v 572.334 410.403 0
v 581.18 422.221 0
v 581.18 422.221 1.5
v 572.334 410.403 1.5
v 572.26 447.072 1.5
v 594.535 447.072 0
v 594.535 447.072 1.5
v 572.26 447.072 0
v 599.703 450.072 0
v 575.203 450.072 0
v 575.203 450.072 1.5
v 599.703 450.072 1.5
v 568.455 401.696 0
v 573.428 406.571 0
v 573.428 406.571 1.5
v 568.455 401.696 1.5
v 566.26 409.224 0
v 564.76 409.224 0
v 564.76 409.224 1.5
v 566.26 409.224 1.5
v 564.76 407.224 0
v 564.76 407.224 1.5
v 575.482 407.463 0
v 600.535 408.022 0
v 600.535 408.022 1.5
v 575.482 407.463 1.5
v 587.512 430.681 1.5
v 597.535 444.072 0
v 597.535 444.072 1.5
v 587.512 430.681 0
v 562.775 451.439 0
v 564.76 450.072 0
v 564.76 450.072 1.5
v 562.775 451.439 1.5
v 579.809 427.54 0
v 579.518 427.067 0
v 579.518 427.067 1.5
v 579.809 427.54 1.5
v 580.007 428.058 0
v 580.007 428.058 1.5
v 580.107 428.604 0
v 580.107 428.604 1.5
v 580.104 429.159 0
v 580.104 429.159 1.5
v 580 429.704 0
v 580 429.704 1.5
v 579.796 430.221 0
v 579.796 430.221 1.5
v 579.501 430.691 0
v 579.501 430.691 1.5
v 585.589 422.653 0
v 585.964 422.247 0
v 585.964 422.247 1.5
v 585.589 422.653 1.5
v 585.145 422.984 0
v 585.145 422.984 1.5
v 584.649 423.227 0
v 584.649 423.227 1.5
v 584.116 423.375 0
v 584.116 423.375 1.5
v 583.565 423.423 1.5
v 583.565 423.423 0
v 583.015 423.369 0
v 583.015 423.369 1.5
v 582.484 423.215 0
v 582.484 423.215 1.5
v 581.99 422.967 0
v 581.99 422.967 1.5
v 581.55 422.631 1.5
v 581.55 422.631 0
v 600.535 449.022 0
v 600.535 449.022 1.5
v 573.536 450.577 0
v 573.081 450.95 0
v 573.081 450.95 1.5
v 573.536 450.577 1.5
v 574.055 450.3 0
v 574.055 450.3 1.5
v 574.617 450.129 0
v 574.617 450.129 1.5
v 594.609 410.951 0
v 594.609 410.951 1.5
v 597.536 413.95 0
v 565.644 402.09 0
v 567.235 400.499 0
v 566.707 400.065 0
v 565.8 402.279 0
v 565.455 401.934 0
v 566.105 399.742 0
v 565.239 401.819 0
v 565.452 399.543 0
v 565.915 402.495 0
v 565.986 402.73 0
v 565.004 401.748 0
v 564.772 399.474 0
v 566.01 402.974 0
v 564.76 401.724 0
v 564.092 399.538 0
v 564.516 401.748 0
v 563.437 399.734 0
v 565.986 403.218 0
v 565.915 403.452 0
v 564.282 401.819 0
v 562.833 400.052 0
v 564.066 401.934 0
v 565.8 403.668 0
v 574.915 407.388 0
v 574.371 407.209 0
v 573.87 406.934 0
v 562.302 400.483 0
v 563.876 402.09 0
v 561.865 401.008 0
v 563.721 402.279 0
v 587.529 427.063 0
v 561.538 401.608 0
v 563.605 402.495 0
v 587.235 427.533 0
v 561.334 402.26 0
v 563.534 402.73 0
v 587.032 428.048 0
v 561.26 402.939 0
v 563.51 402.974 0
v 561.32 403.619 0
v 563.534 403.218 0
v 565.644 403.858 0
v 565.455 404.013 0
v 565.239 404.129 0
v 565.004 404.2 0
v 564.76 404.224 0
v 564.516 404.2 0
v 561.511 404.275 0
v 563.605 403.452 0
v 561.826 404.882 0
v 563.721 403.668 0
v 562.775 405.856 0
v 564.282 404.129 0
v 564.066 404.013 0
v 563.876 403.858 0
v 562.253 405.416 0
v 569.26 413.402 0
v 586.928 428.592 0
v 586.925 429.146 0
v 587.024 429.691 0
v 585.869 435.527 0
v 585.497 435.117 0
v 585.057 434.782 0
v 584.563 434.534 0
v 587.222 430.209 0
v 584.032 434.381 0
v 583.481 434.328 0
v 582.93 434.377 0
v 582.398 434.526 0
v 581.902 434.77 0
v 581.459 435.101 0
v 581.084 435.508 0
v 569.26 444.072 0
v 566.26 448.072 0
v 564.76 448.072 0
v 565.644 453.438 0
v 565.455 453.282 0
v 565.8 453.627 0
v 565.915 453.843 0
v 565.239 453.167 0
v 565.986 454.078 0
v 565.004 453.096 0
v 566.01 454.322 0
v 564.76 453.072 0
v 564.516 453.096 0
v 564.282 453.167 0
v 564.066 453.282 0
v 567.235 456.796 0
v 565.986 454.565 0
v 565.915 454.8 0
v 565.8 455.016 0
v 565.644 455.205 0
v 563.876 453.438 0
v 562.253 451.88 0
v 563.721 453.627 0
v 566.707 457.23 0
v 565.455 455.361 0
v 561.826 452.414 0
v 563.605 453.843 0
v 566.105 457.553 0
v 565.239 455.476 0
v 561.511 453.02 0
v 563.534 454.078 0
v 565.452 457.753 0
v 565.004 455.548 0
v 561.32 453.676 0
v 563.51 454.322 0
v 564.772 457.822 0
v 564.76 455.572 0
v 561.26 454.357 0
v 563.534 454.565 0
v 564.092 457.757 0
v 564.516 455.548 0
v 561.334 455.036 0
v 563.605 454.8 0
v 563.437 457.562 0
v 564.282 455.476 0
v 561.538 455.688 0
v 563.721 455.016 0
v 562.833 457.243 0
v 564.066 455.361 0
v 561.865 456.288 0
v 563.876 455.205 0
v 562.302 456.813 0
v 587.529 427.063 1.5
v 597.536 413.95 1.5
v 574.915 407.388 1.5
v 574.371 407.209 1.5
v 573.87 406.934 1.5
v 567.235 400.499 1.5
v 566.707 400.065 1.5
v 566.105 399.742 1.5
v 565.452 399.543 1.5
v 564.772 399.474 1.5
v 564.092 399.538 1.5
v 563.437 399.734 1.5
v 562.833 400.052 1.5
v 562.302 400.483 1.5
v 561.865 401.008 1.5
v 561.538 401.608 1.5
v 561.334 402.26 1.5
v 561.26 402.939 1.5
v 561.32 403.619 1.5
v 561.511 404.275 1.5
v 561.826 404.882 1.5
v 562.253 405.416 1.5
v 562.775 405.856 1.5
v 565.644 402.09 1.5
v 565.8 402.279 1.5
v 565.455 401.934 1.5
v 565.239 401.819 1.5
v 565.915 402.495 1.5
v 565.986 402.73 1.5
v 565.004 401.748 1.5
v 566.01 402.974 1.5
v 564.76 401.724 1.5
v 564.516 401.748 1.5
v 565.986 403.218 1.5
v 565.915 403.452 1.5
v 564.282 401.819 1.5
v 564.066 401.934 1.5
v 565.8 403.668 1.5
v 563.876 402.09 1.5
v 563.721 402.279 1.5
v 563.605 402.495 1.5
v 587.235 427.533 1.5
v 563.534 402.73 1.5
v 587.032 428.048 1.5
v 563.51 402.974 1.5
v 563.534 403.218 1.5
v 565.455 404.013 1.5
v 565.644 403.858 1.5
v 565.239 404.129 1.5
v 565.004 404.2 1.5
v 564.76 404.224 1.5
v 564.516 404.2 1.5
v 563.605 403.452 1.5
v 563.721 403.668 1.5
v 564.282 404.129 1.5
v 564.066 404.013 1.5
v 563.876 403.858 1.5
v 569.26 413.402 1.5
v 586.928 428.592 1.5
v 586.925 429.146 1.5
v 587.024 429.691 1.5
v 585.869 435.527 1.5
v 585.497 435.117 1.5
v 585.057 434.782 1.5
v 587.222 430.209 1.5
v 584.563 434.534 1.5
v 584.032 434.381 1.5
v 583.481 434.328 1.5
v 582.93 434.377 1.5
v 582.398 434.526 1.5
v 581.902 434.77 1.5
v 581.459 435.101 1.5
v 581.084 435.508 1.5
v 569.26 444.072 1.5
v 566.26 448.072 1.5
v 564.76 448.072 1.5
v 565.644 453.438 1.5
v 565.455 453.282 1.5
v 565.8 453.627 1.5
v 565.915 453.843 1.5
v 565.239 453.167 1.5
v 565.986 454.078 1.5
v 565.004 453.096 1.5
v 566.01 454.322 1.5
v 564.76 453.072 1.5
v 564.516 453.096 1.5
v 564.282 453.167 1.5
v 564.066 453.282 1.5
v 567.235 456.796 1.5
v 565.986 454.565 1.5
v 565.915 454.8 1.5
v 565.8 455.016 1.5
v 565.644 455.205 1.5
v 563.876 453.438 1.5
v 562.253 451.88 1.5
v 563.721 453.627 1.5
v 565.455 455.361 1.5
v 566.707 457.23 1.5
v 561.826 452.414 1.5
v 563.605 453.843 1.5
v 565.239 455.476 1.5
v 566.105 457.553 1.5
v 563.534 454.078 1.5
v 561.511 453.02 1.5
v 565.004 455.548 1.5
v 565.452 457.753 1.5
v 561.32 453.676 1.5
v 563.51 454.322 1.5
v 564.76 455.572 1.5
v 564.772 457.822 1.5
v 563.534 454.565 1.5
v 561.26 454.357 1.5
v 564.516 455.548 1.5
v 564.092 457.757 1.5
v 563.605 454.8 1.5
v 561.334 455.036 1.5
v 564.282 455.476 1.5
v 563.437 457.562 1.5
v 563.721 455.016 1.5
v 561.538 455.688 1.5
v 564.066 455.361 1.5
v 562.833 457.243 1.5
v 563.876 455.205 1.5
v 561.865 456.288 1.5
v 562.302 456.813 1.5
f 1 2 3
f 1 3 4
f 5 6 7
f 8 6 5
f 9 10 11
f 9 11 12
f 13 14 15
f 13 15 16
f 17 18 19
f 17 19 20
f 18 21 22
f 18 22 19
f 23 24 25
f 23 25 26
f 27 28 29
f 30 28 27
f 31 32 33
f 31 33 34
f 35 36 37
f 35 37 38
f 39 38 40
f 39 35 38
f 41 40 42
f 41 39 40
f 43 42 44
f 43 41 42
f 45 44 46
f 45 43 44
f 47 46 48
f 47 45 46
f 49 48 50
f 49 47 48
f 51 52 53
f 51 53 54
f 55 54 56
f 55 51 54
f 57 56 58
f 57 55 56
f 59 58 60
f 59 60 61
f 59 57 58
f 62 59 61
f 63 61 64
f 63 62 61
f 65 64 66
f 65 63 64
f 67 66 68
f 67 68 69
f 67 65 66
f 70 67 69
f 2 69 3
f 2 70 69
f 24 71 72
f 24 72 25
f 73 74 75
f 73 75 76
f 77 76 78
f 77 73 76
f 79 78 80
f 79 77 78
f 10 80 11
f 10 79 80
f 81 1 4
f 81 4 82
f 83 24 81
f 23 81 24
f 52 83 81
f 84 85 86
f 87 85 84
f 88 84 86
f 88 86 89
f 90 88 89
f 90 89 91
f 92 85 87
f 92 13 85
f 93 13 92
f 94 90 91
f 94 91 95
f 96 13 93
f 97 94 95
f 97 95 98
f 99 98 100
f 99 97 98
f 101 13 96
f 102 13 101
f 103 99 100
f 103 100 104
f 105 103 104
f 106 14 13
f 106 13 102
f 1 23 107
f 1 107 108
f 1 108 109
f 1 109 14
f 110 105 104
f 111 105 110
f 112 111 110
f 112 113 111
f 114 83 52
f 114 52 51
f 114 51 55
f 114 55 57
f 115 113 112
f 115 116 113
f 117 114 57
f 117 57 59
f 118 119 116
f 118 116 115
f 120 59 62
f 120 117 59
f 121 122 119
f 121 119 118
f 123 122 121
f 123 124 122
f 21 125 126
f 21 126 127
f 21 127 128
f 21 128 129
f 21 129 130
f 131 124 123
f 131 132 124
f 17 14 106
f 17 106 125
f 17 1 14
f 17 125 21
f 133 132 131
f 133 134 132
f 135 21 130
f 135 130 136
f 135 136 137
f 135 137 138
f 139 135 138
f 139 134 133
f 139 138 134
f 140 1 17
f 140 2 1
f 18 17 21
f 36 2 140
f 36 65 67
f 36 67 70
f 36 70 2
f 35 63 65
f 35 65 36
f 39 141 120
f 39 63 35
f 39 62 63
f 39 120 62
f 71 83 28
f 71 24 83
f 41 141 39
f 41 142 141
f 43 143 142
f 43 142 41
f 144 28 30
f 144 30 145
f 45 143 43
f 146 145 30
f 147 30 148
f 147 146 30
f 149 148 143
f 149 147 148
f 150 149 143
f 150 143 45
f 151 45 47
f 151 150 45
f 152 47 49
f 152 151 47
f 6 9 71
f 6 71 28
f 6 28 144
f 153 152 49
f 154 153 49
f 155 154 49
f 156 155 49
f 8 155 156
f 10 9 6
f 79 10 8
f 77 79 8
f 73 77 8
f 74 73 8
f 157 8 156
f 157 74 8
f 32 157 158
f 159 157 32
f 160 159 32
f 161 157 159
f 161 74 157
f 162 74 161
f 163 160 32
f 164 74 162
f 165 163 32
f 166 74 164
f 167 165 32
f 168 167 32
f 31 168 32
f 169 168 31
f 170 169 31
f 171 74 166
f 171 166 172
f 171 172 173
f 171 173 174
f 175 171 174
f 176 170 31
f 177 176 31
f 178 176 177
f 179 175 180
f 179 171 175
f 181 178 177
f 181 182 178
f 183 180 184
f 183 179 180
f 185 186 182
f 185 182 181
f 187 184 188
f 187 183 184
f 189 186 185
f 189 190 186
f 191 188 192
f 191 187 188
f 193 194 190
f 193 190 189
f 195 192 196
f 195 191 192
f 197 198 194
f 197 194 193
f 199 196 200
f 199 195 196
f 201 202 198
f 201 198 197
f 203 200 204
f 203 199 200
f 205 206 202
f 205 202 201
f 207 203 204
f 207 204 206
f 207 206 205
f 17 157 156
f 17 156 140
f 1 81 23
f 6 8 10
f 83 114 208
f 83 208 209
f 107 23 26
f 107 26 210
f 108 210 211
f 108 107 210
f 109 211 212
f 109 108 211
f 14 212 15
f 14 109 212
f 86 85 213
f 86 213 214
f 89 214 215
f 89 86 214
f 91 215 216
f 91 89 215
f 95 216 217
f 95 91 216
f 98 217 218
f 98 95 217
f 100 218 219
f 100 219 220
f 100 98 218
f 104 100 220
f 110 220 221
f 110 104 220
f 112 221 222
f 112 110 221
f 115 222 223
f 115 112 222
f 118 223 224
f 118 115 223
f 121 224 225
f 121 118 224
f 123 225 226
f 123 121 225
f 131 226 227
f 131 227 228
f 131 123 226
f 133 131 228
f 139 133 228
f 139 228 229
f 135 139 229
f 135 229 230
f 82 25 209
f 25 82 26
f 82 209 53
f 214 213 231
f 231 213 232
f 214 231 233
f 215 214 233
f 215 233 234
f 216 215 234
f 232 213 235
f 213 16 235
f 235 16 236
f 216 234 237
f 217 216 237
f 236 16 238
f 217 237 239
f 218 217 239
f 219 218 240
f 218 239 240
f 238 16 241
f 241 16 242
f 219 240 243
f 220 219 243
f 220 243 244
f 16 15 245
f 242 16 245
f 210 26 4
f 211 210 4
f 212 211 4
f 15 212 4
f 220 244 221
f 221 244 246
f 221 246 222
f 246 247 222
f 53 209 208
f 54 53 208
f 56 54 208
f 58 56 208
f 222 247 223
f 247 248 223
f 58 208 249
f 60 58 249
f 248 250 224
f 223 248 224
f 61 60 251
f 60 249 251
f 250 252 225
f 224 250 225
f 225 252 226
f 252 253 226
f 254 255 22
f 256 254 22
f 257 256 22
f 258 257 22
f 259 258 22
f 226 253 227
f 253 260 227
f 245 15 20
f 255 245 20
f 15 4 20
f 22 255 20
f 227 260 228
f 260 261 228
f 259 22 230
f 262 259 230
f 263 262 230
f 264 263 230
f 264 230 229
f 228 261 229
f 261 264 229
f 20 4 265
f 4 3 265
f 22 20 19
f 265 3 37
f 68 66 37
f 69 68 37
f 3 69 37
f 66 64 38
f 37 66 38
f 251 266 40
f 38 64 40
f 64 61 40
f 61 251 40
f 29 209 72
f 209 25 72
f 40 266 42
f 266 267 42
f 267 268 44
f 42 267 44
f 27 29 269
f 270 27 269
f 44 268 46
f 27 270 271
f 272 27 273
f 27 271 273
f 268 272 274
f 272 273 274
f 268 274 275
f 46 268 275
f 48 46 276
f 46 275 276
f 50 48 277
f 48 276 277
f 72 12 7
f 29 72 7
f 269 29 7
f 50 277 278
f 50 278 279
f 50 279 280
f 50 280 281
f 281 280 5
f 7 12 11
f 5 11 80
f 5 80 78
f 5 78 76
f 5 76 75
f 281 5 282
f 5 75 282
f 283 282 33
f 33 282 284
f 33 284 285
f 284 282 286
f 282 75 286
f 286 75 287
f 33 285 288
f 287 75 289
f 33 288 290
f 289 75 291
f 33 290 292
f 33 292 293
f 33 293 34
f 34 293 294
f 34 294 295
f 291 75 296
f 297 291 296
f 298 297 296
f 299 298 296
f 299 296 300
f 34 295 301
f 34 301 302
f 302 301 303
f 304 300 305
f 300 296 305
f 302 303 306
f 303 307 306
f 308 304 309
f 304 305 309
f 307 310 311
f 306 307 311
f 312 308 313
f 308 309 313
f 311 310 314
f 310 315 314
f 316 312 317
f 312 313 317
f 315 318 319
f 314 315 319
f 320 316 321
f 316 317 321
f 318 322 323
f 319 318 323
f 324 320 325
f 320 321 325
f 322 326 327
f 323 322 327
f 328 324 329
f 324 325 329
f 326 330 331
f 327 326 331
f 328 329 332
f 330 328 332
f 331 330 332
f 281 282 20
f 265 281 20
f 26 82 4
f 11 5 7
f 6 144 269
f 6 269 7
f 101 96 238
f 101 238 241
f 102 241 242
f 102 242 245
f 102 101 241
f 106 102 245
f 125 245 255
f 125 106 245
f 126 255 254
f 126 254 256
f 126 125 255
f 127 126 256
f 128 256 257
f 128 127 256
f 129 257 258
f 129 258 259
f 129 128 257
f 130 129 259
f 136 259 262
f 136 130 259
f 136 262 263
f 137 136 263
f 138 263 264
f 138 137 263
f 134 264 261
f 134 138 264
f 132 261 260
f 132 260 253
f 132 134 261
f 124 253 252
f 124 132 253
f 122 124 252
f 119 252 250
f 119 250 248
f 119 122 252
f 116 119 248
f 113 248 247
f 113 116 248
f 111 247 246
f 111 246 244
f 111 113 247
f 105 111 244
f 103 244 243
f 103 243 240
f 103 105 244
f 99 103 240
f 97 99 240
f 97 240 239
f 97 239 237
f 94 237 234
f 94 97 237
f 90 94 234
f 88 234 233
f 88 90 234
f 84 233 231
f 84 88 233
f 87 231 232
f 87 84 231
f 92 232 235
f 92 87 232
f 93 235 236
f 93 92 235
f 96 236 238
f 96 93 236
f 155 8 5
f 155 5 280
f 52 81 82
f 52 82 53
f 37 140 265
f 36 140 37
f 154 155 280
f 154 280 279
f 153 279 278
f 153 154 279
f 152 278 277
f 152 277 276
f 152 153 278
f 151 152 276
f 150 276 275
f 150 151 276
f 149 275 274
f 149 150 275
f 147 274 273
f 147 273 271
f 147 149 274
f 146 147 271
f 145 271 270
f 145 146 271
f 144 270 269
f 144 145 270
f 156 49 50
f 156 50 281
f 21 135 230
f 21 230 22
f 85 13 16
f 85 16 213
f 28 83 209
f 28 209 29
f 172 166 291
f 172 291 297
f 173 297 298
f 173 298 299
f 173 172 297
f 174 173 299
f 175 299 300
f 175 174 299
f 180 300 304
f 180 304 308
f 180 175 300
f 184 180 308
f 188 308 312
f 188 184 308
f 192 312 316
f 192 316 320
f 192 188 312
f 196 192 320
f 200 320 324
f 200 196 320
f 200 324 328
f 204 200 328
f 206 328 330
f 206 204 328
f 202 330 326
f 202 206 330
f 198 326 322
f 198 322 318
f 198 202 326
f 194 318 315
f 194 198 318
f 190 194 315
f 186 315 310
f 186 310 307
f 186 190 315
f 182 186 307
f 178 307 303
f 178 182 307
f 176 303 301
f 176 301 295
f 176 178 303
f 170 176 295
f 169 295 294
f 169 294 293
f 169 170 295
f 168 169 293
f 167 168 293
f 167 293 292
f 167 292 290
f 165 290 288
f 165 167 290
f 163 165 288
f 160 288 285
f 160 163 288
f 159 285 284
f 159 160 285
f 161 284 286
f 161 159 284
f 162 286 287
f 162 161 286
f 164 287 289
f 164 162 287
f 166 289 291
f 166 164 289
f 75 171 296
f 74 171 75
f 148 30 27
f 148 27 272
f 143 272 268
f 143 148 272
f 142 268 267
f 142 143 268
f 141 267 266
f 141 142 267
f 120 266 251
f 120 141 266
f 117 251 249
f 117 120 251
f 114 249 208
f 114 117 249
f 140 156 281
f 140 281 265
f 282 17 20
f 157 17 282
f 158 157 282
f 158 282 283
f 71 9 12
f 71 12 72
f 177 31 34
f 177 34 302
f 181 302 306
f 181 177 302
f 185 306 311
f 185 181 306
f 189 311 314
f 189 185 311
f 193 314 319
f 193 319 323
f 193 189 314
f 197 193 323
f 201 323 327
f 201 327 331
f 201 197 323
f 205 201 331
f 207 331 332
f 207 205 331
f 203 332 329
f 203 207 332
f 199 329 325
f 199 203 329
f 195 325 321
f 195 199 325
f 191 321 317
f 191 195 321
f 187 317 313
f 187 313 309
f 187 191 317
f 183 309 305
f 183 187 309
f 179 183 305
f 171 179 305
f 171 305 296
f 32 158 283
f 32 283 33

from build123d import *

# Parameters (mm, degrees)
MODEL_R         = 1.25
EXTRUDE_2_DEPTH = 1.5


with BuildPart() as part:
    # Model → 凸台-拉伸2 (new body)
    with BuildSketch(Plane.XY):
        with BuildLine():
            Line((567.23508643, 456.796470283), (573.081278388, 450.950276374))
            ThreePointArc((573.081278388, 450.950276374), (574.054548435, 450.29995812), (575.202598732, 450.071596717))
            Line((575.202598732, 450.071596717), (599.702598732, 450.071596717))
            Line((599.702598732, 450.071596717), (600.534867908, 449.022451897))
            Line((600.534867908, 449.022451897), (600.534867908, 408.022451897))
            Line((600.534867908, 408.022451897), (575.481922704, 407.463178676))
            ThreePointArc((575.481922704, 407.463178676), (574.371365784, 407.209391557), (573.427556635, 406.571450445))
            Line((573.427556635, 406.571450445), (568.455496448, 401.695722345))
            Line((568.455496448, 401.695722345), (567.235086299, 400.498957255))
            ThreePointArc((567.235086299, 400.498957255), (562.070444361, 400.734378517), (562.774755691, 405.856184357))
            Line((562.774755691, 405.856184357), (564.760216971, 407.22383333))
            Line((564.760216971, 407.22383333), (564.760216971, 409.22383333))
            Line((564.760216971, 409.22383333), (566.260216971, 409.22383333))
            Line((566.260216971, 409.22383333), (566.260216971, 448.071599095))
            Line((566.260216971, 448.071599095), (564.760216971, 448.071599095))
            Line((564.760216971, 448.071599095), (564.760216971, 450.071599095))
            Line((564.760216971, 450.071599095), (562.774760372, 451.439240088))
            ThreePointArc((562.774760372, 451.439240088), (562.070442602, 456.56104704), (567.23508643, 456.796470283))
        make_face()
        with Locations((564.760212527, 454.321596717)):
            Circle(MODEL_R, mode=Mode.SUBTRACT)
        with Locations((564.760212527, 402.973830952)):
            Circle(MODEL_R, mode=Mode.SUBTRACT)
        with BuildLine():
            ThreePointArc((579.517792138, 427.066754763), (580.118537337, 428.881766433), (579.50090837, 430.691102394))
            Line((579.50090837, 430.691102394), (569.260212527, 444.071596717))
            Line((569.260212527, 444.071596717), (569.260212527, 413.402282802))
            Line((569.260212527, 413.402282802), (579.517792138, 427.066754763))
        make_face(mode=Mode.SUBTRACT)
        with BuildLine():
            ThreePointArc((581.084435265, 435.507954993), (583.481204613, 434.327912105), (585.868577071, 435.526852168))
            Line((585.868577071, 435.526852168), (594.534929977, 447.071596717))
            Line((594.534929977, 447.071596717), (572.260212527, 447.071596717))
            Line((572.260212527, 447.071596717), (581.084435265, 435.507954993))
        make_face(mode=Mode.SUBTRACT)
        with BuildLine():
            ThreePointArc((585.96375898, 422.246741072), (583.565361337, 423.423386992), (581.179698264, 422.221131371))
            Line((581.179698264, 422.221131371), (572.333907172, 410.403188089))
            Line((572.333907172, 410.403188089), (594.609247843, 410.950544366))
            Line((594.609247843, 410.950544366), (585.96375898, 422.246741072))
        make_face(mode=Mode.SUBTRACT)
        with BuildLine():
            ThreePointArc((587.511830306, 430.680835717), (586.913584899, 428.869200497), (587.528632984, 427.063200611))
            Line((587.528632984, 427.063200611), (597.535553197, 413.949701149))
            Line((597.535553197, 413.949701149), (597.534929977, 444.071658787))
            Line((597.534929977, 444.071658787), (587.511830306, 430.680835717))
        make_face(mode=Mode.SUBTRACT)
    extrude(amount=EXTRUDE_2_DEPTH)


solid = part.part
